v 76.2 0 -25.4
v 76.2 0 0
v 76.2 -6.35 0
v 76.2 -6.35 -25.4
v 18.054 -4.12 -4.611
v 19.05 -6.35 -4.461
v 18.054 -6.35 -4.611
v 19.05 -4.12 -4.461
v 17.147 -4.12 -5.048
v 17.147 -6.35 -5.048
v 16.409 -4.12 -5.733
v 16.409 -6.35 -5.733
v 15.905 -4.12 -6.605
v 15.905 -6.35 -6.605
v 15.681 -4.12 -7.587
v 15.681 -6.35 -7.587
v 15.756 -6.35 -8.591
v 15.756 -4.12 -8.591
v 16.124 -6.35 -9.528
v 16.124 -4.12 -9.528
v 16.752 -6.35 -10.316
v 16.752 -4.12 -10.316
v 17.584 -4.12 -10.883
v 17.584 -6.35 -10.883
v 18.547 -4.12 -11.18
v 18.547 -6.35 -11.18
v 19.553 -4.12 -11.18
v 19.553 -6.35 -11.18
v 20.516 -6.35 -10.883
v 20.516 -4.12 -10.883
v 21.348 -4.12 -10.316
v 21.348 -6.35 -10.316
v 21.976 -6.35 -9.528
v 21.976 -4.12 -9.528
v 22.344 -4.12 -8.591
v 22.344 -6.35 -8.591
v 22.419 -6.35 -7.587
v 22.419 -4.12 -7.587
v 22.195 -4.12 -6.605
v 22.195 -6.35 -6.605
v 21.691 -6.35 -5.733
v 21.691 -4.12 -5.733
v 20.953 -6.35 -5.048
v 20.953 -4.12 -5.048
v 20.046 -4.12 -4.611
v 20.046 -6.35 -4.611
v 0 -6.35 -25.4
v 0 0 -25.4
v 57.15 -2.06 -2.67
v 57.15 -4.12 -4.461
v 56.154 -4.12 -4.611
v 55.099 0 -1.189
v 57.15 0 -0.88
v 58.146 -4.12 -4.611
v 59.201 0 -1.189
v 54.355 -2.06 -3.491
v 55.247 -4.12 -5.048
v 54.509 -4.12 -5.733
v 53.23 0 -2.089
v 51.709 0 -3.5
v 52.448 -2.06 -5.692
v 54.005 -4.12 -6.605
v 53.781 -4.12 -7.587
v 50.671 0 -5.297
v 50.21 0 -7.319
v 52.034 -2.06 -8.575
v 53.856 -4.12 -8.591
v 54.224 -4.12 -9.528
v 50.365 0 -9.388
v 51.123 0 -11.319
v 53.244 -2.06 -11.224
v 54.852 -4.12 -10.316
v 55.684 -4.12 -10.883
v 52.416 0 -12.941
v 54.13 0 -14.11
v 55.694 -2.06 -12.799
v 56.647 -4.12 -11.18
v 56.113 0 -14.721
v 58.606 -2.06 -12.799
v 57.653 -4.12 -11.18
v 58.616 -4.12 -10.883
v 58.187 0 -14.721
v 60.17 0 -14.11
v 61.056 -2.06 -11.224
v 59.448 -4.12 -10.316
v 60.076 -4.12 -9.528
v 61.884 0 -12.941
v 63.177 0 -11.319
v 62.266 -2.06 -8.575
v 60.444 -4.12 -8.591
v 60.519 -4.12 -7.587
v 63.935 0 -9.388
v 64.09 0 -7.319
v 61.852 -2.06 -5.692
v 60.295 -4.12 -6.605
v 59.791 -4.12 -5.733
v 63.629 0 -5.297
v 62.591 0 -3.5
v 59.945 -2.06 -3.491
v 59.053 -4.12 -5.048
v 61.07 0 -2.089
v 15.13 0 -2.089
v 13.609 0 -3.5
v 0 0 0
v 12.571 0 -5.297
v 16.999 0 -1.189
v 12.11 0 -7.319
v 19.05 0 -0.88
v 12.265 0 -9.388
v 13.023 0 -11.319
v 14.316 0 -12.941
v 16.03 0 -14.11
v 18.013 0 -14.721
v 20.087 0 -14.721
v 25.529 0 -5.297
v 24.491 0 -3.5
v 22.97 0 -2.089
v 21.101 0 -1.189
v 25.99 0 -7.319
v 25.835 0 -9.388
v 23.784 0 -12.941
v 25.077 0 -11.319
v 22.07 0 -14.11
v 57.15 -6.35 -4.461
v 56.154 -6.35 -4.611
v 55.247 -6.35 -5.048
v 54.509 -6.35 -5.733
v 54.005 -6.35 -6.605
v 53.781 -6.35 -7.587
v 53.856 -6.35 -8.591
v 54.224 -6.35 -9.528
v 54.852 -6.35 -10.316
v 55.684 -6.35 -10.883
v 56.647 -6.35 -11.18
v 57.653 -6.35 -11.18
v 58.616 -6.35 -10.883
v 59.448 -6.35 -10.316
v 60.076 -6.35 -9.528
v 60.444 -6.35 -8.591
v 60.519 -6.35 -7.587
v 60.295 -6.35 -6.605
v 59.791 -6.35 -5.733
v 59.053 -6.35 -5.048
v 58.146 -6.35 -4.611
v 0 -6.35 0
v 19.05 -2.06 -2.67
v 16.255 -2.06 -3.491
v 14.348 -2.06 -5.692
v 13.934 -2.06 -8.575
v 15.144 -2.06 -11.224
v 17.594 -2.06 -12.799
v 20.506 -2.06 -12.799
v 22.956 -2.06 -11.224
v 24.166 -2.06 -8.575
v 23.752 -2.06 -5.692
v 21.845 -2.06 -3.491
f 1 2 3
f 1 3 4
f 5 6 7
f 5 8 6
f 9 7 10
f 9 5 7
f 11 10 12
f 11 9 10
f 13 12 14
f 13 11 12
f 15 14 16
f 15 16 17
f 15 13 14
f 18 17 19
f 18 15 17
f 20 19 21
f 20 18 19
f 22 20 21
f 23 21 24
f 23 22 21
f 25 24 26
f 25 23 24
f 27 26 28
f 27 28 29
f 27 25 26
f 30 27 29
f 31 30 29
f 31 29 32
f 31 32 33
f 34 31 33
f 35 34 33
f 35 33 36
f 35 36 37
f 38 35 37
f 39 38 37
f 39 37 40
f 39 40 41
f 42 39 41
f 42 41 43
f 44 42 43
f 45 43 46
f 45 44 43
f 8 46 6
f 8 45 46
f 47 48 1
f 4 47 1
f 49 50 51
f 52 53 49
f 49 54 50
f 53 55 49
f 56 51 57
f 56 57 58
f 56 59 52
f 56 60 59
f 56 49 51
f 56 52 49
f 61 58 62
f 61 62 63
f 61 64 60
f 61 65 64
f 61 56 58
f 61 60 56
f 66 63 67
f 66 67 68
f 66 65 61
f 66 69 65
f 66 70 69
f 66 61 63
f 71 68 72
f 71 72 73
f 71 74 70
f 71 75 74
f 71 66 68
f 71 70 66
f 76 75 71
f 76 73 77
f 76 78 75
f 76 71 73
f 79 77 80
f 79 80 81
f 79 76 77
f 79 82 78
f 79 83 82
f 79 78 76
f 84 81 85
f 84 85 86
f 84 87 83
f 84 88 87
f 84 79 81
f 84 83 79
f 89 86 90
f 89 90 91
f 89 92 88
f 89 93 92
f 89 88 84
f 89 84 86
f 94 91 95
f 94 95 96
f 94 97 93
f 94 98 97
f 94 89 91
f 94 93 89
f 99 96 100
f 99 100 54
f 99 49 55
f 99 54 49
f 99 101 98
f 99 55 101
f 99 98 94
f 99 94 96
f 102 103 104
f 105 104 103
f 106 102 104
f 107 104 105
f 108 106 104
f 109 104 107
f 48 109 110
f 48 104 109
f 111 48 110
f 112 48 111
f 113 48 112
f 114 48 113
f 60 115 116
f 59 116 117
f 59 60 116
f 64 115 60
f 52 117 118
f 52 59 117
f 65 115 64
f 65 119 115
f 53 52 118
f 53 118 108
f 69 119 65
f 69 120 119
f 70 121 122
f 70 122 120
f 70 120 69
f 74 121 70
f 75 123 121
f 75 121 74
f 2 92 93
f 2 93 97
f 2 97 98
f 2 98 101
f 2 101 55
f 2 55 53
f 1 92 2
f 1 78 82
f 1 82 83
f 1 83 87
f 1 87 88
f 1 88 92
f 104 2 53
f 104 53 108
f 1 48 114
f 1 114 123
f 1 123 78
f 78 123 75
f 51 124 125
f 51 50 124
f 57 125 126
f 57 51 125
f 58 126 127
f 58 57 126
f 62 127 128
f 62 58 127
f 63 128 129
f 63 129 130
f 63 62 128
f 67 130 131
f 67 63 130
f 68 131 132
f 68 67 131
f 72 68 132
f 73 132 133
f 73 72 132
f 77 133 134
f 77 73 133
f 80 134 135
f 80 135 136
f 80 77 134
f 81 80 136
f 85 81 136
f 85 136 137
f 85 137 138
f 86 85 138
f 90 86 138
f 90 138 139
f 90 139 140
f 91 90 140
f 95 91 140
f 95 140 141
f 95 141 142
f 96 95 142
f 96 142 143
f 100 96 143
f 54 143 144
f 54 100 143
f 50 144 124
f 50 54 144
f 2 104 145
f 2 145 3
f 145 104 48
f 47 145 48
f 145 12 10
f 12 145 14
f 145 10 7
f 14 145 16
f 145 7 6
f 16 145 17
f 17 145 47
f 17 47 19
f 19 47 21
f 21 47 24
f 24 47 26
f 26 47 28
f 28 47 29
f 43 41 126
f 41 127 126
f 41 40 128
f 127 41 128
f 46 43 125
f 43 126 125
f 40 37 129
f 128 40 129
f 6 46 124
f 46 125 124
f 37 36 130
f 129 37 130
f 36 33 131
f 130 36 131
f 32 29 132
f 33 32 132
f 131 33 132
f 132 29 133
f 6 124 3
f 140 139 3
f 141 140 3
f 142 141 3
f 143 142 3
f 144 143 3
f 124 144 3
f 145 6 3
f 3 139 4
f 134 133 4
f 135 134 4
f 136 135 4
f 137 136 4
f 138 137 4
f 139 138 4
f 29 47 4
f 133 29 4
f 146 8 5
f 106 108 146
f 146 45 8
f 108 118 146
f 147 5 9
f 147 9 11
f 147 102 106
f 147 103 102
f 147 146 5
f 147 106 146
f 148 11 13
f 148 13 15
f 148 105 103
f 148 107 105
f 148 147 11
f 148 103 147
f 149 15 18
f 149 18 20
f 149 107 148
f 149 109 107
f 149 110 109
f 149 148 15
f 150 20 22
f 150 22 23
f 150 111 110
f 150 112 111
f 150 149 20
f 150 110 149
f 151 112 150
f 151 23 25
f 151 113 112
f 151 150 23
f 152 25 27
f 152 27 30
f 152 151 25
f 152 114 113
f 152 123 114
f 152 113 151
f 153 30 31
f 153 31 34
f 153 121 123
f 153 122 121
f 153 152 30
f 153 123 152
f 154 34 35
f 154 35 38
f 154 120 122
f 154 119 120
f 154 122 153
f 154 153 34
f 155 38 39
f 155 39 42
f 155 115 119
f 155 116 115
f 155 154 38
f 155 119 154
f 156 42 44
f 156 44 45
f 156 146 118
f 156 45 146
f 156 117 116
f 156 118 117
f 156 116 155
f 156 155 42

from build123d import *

# Parameters (mm, degrees)
SKETCH1_W                                     = 76.2
SKETCH1_H                                     = 25.4
BOSS_EXTRUDE1_DEPTH                           = 6.35
CSK_FOR_1_4_FLAT_HEAD_MACHINE_SCREW1_AT_COUNT = 2
CSK_FOR_1_4_FLAT_HEAD_MACHINE_SCREW1_AT_PITCH = 38.1


with BuildPart() as part:
    # Sketch1 → Boss-Extrude1 (new body)
    with BuildSketch(Plane(origin=(0, 0, 0), x_dir=(1, 0, 0), z_dir=(0, 1, 0))):
        with Locations((38.1, 12.7)):
            Rectangle(SKETCH1_W, SKETCH1_H)
    extrude(amount=-BOSS_EXTRUDE1_DEPTH)

    # Sketch3 → CSK for 1/4 Flat Head Machine Screw1 (revolve, cut)
    with BuildSketch(Plane(origin=(19.05, 0, -7.839304919), x_dir=(0, 0, 1), z_dir=(1, 0, 0))):
        Polygon((0, 0), (0, 6.35), (3.3782, 6.35), (3.3782, 4.119929414), (6.9596, 0), align=None)
    csk_for_1_4_flat_head_machine_screw1 = revolve(axis=Axis((19.05, 6.35, -7.839304919), (0, -1, 0)), mode=Mode.SUBTRACT)

    # CSK for 1/4 Flat Head Machine Screw1 at: CSK for 1/4 Flat Head Machine Screw1 ×2
    with Locations(*[(i * CSK_FOR_1_4_FLAT_HEAD_MACHINE_SCREW1_AT_PITCH, 0, 0) for i in range(1, CSK_FOR_1_4_FLAT_HEAD_MACHINE_SCREW1_AT_COUNT)]):
        add(csk_for_1_4_flat_head_machine_screw1, mode=Mode.SUBTRACT)


solid = part.part
